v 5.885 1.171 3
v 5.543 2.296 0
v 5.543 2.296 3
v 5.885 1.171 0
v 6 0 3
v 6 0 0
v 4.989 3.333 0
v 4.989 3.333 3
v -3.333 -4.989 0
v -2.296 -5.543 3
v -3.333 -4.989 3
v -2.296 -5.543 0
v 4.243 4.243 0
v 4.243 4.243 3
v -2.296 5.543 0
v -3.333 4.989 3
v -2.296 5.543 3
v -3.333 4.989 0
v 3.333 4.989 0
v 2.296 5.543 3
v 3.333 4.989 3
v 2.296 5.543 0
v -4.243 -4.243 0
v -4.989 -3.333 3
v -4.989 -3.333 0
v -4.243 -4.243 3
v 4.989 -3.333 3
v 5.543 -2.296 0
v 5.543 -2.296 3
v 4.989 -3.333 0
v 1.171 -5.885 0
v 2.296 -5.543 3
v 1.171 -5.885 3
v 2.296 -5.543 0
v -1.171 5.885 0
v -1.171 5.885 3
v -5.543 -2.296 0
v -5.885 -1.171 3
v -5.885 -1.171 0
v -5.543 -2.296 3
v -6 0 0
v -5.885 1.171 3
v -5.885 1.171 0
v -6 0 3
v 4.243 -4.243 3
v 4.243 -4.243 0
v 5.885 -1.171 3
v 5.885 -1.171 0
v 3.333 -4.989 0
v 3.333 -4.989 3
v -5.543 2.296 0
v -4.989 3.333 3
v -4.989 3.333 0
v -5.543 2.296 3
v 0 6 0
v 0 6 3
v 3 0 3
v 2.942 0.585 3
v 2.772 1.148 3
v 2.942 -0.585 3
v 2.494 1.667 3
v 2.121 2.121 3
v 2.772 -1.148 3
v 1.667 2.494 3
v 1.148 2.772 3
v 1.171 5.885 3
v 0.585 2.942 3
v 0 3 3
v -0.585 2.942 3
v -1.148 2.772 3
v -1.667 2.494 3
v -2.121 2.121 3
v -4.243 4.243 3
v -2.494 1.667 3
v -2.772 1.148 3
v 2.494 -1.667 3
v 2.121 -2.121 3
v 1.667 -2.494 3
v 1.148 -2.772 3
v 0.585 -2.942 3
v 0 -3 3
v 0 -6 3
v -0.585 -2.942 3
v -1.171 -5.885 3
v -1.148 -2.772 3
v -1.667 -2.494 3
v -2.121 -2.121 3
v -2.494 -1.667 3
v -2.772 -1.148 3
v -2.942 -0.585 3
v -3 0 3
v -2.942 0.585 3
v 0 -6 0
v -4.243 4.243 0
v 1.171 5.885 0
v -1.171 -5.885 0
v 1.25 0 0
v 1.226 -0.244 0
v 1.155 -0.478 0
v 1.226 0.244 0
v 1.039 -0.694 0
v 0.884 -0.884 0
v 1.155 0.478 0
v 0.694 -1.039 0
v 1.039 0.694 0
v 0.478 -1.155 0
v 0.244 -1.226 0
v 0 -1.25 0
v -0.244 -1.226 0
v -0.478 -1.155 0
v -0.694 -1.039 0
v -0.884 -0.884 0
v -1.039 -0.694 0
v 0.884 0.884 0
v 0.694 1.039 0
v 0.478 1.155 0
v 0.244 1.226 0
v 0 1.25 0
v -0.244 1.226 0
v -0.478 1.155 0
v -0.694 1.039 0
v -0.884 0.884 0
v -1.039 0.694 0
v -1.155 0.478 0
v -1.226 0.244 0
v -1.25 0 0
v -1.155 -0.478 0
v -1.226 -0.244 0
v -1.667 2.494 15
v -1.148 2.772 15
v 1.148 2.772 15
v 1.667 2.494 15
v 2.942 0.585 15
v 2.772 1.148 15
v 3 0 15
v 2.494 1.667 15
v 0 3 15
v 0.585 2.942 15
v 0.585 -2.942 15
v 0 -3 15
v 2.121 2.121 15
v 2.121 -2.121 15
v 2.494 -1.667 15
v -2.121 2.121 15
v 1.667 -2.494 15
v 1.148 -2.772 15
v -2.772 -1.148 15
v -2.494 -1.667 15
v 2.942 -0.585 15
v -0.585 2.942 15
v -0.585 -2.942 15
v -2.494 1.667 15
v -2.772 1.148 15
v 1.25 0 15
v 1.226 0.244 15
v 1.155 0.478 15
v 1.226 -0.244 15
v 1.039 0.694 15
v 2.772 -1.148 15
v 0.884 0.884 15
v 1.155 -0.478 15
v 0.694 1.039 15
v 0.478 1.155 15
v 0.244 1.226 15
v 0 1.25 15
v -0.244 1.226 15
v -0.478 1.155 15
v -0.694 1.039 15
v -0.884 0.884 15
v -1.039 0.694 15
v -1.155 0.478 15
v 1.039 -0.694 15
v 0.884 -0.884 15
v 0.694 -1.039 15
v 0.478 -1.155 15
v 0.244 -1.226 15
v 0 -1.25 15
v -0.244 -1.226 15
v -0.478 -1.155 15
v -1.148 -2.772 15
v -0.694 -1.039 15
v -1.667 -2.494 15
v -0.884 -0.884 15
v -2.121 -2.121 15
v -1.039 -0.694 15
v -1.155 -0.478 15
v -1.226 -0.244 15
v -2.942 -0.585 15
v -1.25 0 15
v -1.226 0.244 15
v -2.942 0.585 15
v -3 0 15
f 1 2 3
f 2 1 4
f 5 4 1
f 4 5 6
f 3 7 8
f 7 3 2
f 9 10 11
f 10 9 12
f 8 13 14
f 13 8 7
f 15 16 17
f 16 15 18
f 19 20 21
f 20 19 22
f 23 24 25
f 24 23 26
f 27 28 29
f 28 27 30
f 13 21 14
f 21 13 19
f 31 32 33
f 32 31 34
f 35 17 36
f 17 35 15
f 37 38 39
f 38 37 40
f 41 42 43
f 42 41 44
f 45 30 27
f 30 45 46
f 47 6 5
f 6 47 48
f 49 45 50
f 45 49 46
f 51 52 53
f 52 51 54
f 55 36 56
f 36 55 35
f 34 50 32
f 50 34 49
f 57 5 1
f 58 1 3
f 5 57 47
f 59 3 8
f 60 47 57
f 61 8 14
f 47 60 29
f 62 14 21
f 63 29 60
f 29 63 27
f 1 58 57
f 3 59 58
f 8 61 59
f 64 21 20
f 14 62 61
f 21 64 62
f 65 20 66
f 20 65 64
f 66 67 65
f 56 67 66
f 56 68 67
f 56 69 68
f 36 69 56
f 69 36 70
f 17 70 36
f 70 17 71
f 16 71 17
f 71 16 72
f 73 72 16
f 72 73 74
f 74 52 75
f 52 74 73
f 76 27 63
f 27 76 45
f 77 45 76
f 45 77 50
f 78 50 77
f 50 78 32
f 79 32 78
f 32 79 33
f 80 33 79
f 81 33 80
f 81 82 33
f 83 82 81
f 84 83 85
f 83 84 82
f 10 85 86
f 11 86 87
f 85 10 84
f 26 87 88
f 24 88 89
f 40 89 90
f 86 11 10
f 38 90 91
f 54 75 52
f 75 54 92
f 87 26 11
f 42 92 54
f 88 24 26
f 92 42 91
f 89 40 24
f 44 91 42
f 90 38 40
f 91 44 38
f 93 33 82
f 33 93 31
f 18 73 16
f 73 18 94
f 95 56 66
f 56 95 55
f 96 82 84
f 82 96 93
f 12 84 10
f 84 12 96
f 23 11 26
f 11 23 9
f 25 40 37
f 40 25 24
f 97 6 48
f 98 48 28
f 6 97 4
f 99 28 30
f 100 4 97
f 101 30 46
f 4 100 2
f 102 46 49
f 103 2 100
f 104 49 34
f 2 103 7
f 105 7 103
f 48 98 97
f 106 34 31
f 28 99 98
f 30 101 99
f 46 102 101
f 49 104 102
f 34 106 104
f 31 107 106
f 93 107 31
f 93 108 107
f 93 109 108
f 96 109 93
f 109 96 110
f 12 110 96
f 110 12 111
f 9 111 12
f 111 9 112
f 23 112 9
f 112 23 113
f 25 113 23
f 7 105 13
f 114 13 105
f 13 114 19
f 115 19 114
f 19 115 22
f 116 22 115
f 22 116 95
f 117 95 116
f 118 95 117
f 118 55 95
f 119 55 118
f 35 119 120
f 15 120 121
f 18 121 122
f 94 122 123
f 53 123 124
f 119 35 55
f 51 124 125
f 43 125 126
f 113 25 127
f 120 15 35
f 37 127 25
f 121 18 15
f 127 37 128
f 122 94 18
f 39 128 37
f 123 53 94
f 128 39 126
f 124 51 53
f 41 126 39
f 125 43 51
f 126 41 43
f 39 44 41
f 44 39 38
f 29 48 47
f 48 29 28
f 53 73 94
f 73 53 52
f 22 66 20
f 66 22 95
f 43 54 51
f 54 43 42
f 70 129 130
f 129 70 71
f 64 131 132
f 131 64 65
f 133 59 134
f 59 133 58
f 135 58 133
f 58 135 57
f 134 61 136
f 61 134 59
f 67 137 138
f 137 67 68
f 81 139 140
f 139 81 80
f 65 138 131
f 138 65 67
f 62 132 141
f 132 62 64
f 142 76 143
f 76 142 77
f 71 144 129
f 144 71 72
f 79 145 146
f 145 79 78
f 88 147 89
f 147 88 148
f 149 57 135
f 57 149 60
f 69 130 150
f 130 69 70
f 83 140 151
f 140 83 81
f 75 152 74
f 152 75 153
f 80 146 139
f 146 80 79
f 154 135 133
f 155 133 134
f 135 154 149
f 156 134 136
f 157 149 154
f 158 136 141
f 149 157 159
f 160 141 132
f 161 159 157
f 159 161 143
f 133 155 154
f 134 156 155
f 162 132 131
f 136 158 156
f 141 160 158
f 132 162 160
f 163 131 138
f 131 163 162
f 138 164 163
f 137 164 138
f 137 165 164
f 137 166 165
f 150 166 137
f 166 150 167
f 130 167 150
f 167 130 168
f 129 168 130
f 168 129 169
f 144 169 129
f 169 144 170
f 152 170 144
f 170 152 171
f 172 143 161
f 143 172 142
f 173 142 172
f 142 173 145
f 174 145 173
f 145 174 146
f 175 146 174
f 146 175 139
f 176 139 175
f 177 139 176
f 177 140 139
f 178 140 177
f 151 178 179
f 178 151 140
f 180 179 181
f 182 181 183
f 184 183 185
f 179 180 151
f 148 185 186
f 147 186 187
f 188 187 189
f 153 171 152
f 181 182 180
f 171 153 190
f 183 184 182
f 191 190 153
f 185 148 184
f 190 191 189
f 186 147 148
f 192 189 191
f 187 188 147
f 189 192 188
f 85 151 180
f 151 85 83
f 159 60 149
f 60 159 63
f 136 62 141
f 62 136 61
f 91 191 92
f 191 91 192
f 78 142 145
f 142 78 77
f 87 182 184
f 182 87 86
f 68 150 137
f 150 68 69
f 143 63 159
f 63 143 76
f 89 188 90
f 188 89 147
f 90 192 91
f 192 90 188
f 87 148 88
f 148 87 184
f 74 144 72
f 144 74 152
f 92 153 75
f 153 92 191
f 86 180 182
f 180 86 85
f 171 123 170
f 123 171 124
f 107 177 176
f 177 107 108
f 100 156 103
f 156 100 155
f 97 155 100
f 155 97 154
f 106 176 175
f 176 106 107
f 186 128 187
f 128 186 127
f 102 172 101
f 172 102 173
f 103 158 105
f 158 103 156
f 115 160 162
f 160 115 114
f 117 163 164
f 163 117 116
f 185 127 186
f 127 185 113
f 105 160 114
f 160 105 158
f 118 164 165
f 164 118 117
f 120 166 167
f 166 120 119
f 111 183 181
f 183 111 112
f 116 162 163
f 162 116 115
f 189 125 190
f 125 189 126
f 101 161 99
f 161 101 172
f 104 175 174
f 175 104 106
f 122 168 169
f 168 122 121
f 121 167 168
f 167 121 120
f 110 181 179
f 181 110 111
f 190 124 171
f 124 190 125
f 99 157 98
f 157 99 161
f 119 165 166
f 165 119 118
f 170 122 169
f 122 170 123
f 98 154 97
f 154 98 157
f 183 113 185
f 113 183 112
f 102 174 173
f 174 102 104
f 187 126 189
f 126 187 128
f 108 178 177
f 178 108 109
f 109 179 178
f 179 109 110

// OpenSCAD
$fn = 32;

// ----------------------------------------------------------------------
// Micro post: flanged post, 5-20 mm class
// ----------------------------------------------------------------------

// --- parameters (mm) ---
post_d = 6;               // post diameter
post_h = 12;              // post height above the flange
flange_d = 12;            // flange diameter
flange_t = 3;             // flange thickness
bore_d = 2.5;             // through bore

total_h = post_h + flange_t;  // overall height

difference() {
  union() {
    cylinder(h = flange_t, d = flange_d);
    translate([0, 0, flange_t]) cylinder(h = post_h, d = post_d);
  }
  translate([0, 0, -1]) cylinder(h = total_h + 2, d = bore_d);
}
